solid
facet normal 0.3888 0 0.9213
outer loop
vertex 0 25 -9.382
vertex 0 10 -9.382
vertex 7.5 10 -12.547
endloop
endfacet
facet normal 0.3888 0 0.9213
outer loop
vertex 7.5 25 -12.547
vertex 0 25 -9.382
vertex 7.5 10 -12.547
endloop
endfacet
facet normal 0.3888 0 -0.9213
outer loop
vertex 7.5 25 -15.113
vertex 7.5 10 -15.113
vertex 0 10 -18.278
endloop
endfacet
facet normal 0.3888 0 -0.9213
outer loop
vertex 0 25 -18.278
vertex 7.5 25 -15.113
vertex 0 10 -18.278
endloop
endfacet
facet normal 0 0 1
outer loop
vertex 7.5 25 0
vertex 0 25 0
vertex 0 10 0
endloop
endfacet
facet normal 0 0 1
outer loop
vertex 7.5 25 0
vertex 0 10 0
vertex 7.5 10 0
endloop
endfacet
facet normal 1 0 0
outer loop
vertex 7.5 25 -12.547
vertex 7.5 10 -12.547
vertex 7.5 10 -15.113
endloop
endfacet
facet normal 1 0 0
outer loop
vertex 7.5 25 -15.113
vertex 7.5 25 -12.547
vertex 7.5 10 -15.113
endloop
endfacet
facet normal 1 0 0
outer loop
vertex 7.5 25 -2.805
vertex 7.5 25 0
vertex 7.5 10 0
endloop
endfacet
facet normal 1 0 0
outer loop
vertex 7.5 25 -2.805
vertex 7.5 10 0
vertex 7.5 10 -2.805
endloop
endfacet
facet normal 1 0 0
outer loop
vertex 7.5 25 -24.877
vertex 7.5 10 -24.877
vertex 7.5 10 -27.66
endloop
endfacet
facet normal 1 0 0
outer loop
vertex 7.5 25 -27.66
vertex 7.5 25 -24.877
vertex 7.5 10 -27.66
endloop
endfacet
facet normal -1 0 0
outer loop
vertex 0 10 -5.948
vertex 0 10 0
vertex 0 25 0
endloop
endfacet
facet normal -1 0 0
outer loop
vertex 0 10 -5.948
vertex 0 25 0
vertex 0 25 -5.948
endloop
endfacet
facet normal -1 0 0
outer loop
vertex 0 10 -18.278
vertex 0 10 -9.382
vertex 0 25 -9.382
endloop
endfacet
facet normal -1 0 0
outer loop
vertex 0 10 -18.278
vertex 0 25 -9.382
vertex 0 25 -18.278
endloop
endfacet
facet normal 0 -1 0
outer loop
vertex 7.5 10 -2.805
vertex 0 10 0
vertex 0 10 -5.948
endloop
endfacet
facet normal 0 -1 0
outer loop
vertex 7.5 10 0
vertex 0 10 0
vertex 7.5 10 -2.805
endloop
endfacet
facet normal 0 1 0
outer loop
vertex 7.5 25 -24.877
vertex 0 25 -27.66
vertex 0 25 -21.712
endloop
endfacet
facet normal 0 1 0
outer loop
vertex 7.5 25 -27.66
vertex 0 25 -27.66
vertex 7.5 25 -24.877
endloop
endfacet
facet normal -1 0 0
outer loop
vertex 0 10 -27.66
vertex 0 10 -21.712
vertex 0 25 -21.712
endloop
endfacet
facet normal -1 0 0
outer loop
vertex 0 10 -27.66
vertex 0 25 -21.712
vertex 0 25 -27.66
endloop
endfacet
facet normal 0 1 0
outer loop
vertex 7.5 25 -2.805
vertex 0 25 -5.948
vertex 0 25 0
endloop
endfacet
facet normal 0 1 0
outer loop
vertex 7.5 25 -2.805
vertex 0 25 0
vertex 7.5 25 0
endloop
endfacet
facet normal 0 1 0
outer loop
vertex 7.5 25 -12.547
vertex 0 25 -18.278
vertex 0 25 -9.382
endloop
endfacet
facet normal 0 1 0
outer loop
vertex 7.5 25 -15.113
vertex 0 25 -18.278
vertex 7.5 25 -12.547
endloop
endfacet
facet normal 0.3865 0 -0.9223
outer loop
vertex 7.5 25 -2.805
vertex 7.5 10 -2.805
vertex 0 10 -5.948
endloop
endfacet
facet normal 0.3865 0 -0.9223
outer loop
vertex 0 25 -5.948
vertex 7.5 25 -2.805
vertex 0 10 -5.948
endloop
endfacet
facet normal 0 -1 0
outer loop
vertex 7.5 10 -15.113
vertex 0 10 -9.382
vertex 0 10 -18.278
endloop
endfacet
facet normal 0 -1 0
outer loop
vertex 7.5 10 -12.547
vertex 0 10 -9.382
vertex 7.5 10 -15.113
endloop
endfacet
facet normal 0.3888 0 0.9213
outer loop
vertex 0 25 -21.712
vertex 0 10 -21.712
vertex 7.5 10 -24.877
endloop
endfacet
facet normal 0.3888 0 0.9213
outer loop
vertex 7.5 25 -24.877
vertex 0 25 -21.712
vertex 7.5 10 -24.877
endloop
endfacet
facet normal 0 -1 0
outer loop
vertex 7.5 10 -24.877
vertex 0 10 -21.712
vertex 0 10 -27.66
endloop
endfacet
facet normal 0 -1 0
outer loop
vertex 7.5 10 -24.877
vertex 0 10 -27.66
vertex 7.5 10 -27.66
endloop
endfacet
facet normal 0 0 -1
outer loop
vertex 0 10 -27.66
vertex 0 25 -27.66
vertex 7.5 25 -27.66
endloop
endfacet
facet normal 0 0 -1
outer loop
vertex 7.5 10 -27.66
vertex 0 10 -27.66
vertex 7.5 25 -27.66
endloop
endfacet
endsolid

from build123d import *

# Parameters (mm, degrees)
SKETCH1_W               = 7.5
SKETCH1_H               = 27.66
BOSS_EXTRUDE1_DEPTH     = 25
SKETCH2_W               = 7.5
SKETCH2_H               = 27.66
CUT_EXTRUDE1_DEPTH      = 10
CUT_EXTRUDE2_DEPTH      = 1
CUT_EXTRUDE2_DEPTH_BACK = 16
CUT_EXTRUDE3_DEPTH      = 1
CUT_EXTRUDE3_DEPTH_BACK = 16


with BuildPart() as part:
    # Sketch1 → Boss-Extrude1 (new body)
    with BuildSketch(Plane(origin=(0, 0, 0), x_dir=(1, 0, 0), z_dir=(0, 1, 0))):
        with Locations((3.75, 13.83)):
            Rectangle(SKETCH1_W, SKETCH1_H)
    extrude(amount=BOSS_EXTRUDE1_DEPTH)

    # Sketch2 → Cut-Extrude1 (cut)
    with BuildSketch(Plane.XZ):
        with Locations((3.75, -13.83)):
            Rectangle(SKETCH2_W, SKETCH2_H)
    extrude(amount=-CUT_EXTRUDE1_DEPTH, mode=Mode.SUBTRACT)

    # Sketch3 → Cut-Extrude2 (cut, two sides)
    with BuildSketch(Plane.XZ.offset(-10)) as cut_extrude2_sk:
        Polygon((0, -5.948150323), (0, -6.381849677), (7.5, -3.239049355), (7.5, -2.805350002), align=None)
        Polygon((7.5, -12.112920844), (0, -8.947920844), (0, -9.382079156), (7.5, -12.547079156), align=None)
        Polygon((0, -18.277920844), (0, -18.712079156), (7.5, -15.547079156), (7.5, -15.112920844), align=None)
        Polygon((7.5, -24.442920844), (0, -21.277920844), (0, -21.712079156), (7.5, -24.877079156), align=None)
    extrude(amount=CUT_EXTRUDE2_DEPTH, mode=Mode.SUBTRACT)
    extrude(cut_extrude2_sk.sketch, amount=-CUT_EXTRUDE2_DEPTH_BACK, mode=Mode.SUBTRACT)

    # Sketch4 → Cut-Extrude3 (cut, two sides)
    with BuildSketch(Plane.XZ.offset(-10)) as cut_extrude3_sk:
        Polygon((0, -18.712079156), (7.5, -15.547079156), (7.5, -24.442920844), (0, -21.277920844), align=None)
        Polygon((0, -6.381849677), (7.5, -3.239049355), (7.5, -12.112920844), (0, -8.947920844), align=None)
    extrude(amount=CUT_EXTRUDE3_DEPTH, mode=Mode.SUBTRACT)
    extrude(cut_extrude3_sk.sketch, amount=-CUT_EXTRUDE3_DEPTH_BACK, mode=Mode.SUBTRACT)


solid = part.part
